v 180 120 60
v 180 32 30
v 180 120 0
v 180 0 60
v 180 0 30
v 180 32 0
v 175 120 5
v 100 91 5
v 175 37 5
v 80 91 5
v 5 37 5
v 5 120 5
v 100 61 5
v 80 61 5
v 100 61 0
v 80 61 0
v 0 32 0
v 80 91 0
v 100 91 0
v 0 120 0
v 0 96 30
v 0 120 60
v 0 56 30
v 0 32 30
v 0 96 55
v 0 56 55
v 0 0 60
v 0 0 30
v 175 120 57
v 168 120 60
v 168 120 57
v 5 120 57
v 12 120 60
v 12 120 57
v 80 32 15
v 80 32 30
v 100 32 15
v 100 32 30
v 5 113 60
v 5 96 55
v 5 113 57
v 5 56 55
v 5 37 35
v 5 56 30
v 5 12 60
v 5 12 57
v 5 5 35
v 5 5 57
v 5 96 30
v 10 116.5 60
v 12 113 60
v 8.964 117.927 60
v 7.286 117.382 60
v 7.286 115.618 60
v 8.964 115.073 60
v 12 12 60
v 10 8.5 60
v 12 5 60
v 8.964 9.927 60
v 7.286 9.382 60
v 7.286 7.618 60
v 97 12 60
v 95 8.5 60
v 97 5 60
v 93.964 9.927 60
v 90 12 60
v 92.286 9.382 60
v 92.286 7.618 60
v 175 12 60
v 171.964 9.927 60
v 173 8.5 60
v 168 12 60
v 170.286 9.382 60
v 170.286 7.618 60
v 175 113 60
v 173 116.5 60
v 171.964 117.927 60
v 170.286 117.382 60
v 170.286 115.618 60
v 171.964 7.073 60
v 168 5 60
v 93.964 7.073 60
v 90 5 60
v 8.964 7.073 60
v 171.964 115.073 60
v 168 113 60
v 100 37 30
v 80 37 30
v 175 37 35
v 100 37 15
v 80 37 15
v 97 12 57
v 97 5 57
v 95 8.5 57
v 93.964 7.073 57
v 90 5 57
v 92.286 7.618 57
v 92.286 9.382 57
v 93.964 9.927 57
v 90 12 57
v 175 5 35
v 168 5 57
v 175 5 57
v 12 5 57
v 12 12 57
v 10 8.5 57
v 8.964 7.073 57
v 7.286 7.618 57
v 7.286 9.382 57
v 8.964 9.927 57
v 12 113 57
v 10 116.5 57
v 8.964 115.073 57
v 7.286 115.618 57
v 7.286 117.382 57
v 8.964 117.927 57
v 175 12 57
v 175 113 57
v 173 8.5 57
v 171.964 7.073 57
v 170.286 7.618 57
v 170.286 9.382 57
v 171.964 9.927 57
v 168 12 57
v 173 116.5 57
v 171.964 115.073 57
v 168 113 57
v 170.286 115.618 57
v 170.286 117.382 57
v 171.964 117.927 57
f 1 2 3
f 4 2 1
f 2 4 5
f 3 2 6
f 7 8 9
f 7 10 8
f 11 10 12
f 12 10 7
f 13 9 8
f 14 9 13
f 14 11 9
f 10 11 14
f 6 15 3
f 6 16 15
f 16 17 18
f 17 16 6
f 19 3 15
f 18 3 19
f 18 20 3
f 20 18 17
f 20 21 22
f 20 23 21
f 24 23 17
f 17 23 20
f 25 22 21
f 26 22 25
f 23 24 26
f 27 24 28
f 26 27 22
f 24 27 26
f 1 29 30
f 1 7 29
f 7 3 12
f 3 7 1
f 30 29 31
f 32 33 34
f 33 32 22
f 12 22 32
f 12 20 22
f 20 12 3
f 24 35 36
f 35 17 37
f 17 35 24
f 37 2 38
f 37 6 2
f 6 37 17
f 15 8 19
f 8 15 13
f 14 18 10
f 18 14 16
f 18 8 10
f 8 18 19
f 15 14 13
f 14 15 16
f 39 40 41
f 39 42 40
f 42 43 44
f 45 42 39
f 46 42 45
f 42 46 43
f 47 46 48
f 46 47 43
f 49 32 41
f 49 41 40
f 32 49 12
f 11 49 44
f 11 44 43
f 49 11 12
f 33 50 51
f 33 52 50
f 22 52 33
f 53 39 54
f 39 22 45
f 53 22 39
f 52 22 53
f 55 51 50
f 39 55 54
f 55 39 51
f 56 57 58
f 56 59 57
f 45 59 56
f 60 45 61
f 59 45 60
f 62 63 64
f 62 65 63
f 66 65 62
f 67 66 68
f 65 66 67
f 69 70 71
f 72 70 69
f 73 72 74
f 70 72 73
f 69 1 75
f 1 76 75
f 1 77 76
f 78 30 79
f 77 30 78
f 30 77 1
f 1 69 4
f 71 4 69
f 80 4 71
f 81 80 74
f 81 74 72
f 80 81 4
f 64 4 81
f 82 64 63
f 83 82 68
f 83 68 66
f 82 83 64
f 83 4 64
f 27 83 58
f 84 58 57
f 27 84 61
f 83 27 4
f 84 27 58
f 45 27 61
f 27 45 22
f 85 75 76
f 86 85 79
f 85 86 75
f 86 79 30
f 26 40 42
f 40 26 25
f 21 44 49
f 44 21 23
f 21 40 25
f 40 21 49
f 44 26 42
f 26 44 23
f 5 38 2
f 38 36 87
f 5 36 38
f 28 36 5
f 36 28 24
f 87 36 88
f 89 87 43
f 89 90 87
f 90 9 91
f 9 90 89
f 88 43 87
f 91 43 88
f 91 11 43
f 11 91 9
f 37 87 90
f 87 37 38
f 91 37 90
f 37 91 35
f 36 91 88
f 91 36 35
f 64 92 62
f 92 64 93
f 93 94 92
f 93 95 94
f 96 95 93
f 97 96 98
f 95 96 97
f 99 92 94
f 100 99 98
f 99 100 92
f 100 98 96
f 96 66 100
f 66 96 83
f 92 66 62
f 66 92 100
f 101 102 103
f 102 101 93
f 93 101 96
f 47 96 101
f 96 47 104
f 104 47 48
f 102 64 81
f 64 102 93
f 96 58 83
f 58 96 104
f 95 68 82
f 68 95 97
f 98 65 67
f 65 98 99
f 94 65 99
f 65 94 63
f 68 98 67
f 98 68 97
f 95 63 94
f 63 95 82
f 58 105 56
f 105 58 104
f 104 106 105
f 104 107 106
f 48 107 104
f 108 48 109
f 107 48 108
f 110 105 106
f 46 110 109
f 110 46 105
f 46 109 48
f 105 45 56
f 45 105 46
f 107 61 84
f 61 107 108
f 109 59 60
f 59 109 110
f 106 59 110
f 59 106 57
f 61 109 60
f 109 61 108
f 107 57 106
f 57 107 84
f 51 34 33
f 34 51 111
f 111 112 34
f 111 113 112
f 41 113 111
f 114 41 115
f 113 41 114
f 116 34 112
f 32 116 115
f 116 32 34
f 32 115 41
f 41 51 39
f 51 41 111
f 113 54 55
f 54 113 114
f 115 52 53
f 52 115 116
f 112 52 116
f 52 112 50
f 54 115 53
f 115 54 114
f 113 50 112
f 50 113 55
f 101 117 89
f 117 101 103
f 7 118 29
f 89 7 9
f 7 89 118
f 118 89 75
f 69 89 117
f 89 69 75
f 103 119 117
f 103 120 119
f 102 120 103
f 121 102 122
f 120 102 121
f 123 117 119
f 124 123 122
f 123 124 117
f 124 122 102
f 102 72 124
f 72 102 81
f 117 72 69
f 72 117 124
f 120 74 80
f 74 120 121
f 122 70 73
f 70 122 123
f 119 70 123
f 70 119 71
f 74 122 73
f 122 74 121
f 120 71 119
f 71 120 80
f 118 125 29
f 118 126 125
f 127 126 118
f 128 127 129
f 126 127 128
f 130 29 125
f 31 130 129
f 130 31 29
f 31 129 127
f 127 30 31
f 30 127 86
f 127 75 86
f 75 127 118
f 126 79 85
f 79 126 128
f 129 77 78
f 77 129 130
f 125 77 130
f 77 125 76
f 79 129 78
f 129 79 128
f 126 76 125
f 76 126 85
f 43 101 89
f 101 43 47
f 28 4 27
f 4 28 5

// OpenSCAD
base_z = 60;
base_x = 180;
base_y = 120;

shelf_z = 30;
shelf_x = base_x;
shelf_y = 32;

wall_thickness = 5;

translate([0,shelf_y,0]) {
    //base cube
    difference(){
        cube([base_x,base_y-shelf_y,wall_thickness]);   
        cable_opening_x = 20;
        cable_opening_y = 30;
        //cable opening in base cube
        translate([base_x/2-cable_opening_x/2, (base_y-shelf_y)/2 - cable_opening_y/2,0]){
            cube([cable_opening_x,cable_opening_y,wall_thickness]); 
        }
    } 
}


translate([0,shelf_y,0]) {
    //left wall
    difference(){
        color("red")
        cube([wall_thickness,base_y-shelf_y,base_z]);     
        cable_opening_y = 40;
        cable_opening_z = 25;
        //cable opening in left wall
        translate([0, (base_y-cable_opening_y-shelf_y)/2, base_z - cable_opening_z - wall_thickness]){
            cube([wall_thickness,cable_opening_y,cable_opening_z]); 
        }
    }    
}

translate([base_x-wall_thickness,shelf_y,0]) {
    //right wall
    cube([wall_thickness,base_y-shelf_y,base_z]);        
}

translate([0,0,shelf_z]) {
    color("green")
    //shelf base    
    cube([shelf_x,shelf_y+wall_thickness,wall_thickness]);       
}

translate([0,shelf_y,0]) {
    //shelf front wall upper
    difference(){
        color("green")
        cube([shelf_x,wall_thickness,shelf_z]);     
        cable_opening_x = 20;
        cable_opening_z = 15;
        //cable opening in front upper wall
        translate([shelf_x/2-cable_opening_x/2, 0,shelf_z - cable_opening_z]){
            cube([cable_opening_x,wall_thickness,cable_opening_z]); 
        }
    }
}

translate([0,0,shelf_z]) {
    color("green")
    //shelf front wall lower
    cube([shelf_x,wall_thickness,shelf_z]);       
}

translate([shelf_x- wall_thickness,0,shelf_z]) {
    //shelf right wall
    cube([wall_thickness,shelf_y,base_z-shelf_z]);        
}

translate([0,0,shelf_z]) {
    color("red")
    //shelf left wall
    cube([wall_thickness,shelf_y,base_z-shelf_z]);        
}

module base_screw_plate(plate_size=7, screw_size=3, plate_thickness=3, x,y){
    screw_plate_size = 7;
    screw_plate_thickness = 3;
    translate([x,y,base_z-screw_plate_thickness]) {
        difference(){
            color("blue")
            //base_screw_hole 
            cube([screw_plate_size, screw_plate_size , screw_plate_thickness]);
            color("red")
            translate([screw_plate_size/2, screw_plate_size/2, 0]){
                cylinder (h = screw_plate_thickness, r=1.5);
            }
        }   
    }
}

base_screw_plate(x = base_x/2, y = wall_thickness);
base_screw_plate(x = wall_thickness, y = wall_thickness);
base_screw_plate(x = wall_thickness, y = base_y-7);
base_screw_plate(x = base_x - 12, y = wall_thickness);
base_screw_plate(x = base_x - 12, y = base_y-7);
